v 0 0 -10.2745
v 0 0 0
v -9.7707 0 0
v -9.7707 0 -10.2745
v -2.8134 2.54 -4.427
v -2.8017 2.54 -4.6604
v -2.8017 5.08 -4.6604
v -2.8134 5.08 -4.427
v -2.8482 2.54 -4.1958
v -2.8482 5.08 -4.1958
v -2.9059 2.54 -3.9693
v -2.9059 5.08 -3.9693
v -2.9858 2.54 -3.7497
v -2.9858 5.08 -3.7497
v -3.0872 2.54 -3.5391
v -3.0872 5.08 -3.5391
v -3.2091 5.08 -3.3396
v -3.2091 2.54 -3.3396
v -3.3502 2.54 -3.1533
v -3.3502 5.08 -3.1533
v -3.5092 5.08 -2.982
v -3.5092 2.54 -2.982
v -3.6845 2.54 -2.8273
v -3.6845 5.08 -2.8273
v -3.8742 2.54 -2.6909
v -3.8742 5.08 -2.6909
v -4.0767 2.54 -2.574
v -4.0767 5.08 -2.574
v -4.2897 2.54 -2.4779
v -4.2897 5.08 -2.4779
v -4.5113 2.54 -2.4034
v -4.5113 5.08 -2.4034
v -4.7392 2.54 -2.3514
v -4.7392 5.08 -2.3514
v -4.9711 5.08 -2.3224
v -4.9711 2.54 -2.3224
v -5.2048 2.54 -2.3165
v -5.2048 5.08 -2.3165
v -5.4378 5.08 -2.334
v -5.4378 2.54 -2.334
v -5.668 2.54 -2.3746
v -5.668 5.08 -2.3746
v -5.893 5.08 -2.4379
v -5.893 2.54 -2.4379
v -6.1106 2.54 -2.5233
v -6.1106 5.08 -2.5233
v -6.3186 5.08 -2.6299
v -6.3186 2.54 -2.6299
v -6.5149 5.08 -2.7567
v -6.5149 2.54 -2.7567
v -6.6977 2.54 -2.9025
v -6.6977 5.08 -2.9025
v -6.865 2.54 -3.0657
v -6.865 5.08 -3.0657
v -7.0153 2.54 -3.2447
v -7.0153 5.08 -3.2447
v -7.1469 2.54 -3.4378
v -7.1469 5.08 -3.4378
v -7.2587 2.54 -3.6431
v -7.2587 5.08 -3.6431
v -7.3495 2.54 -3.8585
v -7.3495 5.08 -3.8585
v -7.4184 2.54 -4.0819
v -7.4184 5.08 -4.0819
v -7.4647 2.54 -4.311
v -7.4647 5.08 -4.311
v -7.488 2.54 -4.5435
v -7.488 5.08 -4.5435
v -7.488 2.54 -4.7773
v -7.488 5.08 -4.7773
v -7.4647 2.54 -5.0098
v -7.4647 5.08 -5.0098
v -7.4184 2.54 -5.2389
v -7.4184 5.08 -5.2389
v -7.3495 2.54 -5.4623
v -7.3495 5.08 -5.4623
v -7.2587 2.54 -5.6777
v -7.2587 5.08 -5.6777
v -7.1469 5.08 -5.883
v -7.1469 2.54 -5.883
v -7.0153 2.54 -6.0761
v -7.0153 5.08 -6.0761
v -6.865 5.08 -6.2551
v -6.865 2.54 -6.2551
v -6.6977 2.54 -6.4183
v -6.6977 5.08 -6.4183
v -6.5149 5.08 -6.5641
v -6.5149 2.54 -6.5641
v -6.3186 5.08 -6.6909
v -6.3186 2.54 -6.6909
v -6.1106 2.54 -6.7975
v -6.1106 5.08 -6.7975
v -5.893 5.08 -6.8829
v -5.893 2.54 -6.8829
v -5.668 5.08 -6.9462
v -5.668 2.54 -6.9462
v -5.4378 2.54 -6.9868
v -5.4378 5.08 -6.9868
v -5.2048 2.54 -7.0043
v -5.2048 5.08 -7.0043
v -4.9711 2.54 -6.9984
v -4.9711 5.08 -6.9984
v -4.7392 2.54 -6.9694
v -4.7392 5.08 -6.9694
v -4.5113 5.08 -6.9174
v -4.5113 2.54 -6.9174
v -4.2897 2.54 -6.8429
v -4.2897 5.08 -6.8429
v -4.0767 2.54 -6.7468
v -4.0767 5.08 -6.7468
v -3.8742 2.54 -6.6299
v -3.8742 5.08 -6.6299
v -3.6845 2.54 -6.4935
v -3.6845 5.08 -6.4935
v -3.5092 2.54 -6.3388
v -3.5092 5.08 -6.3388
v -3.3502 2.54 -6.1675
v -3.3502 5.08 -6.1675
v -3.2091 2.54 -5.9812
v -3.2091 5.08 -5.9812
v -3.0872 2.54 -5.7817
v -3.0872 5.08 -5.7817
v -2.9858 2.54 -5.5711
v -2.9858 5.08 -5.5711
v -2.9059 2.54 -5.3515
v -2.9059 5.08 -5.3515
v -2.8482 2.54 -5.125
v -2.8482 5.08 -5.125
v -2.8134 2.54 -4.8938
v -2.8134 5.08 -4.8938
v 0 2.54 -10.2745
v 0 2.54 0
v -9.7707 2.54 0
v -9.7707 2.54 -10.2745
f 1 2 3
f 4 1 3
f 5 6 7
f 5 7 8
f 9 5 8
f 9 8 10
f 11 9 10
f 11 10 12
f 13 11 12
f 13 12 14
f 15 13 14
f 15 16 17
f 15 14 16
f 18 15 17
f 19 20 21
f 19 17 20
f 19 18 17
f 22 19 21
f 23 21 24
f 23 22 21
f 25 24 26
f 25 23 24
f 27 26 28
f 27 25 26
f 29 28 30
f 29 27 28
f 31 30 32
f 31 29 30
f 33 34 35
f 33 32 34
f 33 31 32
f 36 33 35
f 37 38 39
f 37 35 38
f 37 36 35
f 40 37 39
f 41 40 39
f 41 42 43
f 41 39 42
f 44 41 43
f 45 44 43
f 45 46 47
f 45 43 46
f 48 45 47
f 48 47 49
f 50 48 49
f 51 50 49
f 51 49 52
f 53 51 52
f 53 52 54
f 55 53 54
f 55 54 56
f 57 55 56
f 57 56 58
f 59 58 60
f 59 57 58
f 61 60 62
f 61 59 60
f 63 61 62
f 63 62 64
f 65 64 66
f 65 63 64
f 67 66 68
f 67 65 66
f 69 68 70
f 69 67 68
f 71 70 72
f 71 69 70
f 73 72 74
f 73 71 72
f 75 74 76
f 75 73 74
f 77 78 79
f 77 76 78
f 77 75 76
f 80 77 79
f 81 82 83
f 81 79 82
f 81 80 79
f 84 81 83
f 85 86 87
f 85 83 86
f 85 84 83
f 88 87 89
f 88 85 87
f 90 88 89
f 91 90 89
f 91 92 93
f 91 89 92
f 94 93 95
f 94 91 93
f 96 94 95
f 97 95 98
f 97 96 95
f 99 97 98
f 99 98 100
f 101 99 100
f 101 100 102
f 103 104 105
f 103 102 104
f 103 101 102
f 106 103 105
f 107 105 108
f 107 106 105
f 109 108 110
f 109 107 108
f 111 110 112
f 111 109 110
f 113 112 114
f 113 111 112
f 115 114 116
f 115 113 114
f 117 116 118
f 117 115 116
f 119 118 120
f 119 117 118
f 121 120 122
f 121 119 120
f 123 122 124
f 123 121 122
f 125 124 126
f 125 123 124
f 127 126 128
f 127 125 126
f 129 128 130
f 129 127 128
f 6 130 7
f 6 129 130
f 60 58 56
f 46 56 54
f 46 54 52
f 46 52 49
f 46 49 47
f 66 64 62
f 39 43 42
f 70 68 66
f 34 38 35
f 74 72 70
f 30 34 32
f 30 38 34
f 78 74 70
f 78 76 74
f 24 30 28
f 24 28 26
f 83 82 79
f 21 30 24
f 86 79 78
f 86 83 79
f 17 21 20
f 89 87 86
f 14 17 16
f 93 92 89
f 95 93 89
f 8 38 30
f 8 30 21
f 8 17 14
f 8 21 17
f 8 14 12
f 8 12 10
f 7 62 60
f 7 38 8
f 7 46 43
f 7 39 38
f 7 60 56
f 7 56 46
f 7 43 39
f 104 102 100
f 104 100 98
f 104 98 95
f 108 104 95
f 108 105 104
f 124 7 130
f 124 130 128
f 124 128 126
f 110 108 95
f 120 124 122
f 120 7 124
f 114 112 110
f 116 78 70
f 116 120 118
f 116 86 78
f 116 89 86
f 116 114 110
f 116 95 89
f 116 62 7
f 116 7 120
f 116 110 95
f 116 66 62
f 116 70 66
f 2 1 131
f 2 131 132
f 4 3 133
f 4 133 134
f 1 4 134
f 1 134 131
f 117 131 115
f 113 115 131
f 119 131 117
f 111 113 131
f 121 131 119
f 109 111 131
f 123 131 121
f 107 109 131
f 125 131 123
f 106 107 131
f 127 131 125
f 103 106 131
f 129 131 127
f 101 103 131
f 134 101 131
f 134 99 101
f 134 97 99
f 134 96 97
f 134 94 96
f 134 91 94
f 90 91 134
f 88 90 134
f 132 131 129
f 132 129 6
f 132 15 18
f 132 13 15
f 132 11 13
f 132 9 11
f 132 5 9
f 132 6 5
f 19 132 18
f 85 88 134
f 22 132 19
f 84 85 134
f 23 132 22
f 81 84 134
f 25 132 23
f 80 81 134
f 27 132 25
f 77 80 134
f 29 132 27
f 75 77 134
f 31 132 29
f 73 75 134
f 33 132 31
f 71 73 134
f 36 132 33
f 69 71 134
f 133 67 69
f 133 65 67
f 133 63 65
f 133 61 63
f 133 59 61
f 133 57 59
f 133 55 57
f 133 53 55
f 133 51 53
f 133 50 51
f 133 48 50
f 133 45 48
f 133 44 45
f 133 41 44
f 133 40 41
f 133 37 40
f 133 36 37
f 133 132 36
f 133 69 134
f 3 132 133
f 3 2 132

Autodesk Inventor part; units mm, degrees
ref_plane "YZ Plane" through (0, 0, 0) normal (1, 0, 0) x (0, 1, 0)
ref_plane "XZ Plane" through (0, 0, 0) normal (0, 1, 0) x (-1, 0, 0)
ref_plane "XY Plane" through (0, 0, 0) normal (0, 0, 1) x (1, 0, 0)
sketch "Sketch1" plane through (0, 0, 0) normal (0, 1, 0) x (-1, 0, 0)
  line L0 (0, 0) -> (9.7707, 0)
  line L1 (9.7707, 0) -> (9.7707, -10.2745)
  line L2 (9.7707, -10.2745) -> (0, -10.2745)
  line L3 (0, -10.2745) -> (0, 0)
extrude "Extrusion1" add sketch "Sketch1" along normal blind 2.54
sketch "Sketch2" plane through (0, 2.54, 0) normal (0, 1, 0) x (1, 0, 0)
  circle A0 centre (-5.1463, 4.6604) radius 2.3446
  point P0 (0, 0)
extrude "Extrusion2" add sketch "Sketch2" along normal blind 2.54
properties part number "offset_sketch_plane"
